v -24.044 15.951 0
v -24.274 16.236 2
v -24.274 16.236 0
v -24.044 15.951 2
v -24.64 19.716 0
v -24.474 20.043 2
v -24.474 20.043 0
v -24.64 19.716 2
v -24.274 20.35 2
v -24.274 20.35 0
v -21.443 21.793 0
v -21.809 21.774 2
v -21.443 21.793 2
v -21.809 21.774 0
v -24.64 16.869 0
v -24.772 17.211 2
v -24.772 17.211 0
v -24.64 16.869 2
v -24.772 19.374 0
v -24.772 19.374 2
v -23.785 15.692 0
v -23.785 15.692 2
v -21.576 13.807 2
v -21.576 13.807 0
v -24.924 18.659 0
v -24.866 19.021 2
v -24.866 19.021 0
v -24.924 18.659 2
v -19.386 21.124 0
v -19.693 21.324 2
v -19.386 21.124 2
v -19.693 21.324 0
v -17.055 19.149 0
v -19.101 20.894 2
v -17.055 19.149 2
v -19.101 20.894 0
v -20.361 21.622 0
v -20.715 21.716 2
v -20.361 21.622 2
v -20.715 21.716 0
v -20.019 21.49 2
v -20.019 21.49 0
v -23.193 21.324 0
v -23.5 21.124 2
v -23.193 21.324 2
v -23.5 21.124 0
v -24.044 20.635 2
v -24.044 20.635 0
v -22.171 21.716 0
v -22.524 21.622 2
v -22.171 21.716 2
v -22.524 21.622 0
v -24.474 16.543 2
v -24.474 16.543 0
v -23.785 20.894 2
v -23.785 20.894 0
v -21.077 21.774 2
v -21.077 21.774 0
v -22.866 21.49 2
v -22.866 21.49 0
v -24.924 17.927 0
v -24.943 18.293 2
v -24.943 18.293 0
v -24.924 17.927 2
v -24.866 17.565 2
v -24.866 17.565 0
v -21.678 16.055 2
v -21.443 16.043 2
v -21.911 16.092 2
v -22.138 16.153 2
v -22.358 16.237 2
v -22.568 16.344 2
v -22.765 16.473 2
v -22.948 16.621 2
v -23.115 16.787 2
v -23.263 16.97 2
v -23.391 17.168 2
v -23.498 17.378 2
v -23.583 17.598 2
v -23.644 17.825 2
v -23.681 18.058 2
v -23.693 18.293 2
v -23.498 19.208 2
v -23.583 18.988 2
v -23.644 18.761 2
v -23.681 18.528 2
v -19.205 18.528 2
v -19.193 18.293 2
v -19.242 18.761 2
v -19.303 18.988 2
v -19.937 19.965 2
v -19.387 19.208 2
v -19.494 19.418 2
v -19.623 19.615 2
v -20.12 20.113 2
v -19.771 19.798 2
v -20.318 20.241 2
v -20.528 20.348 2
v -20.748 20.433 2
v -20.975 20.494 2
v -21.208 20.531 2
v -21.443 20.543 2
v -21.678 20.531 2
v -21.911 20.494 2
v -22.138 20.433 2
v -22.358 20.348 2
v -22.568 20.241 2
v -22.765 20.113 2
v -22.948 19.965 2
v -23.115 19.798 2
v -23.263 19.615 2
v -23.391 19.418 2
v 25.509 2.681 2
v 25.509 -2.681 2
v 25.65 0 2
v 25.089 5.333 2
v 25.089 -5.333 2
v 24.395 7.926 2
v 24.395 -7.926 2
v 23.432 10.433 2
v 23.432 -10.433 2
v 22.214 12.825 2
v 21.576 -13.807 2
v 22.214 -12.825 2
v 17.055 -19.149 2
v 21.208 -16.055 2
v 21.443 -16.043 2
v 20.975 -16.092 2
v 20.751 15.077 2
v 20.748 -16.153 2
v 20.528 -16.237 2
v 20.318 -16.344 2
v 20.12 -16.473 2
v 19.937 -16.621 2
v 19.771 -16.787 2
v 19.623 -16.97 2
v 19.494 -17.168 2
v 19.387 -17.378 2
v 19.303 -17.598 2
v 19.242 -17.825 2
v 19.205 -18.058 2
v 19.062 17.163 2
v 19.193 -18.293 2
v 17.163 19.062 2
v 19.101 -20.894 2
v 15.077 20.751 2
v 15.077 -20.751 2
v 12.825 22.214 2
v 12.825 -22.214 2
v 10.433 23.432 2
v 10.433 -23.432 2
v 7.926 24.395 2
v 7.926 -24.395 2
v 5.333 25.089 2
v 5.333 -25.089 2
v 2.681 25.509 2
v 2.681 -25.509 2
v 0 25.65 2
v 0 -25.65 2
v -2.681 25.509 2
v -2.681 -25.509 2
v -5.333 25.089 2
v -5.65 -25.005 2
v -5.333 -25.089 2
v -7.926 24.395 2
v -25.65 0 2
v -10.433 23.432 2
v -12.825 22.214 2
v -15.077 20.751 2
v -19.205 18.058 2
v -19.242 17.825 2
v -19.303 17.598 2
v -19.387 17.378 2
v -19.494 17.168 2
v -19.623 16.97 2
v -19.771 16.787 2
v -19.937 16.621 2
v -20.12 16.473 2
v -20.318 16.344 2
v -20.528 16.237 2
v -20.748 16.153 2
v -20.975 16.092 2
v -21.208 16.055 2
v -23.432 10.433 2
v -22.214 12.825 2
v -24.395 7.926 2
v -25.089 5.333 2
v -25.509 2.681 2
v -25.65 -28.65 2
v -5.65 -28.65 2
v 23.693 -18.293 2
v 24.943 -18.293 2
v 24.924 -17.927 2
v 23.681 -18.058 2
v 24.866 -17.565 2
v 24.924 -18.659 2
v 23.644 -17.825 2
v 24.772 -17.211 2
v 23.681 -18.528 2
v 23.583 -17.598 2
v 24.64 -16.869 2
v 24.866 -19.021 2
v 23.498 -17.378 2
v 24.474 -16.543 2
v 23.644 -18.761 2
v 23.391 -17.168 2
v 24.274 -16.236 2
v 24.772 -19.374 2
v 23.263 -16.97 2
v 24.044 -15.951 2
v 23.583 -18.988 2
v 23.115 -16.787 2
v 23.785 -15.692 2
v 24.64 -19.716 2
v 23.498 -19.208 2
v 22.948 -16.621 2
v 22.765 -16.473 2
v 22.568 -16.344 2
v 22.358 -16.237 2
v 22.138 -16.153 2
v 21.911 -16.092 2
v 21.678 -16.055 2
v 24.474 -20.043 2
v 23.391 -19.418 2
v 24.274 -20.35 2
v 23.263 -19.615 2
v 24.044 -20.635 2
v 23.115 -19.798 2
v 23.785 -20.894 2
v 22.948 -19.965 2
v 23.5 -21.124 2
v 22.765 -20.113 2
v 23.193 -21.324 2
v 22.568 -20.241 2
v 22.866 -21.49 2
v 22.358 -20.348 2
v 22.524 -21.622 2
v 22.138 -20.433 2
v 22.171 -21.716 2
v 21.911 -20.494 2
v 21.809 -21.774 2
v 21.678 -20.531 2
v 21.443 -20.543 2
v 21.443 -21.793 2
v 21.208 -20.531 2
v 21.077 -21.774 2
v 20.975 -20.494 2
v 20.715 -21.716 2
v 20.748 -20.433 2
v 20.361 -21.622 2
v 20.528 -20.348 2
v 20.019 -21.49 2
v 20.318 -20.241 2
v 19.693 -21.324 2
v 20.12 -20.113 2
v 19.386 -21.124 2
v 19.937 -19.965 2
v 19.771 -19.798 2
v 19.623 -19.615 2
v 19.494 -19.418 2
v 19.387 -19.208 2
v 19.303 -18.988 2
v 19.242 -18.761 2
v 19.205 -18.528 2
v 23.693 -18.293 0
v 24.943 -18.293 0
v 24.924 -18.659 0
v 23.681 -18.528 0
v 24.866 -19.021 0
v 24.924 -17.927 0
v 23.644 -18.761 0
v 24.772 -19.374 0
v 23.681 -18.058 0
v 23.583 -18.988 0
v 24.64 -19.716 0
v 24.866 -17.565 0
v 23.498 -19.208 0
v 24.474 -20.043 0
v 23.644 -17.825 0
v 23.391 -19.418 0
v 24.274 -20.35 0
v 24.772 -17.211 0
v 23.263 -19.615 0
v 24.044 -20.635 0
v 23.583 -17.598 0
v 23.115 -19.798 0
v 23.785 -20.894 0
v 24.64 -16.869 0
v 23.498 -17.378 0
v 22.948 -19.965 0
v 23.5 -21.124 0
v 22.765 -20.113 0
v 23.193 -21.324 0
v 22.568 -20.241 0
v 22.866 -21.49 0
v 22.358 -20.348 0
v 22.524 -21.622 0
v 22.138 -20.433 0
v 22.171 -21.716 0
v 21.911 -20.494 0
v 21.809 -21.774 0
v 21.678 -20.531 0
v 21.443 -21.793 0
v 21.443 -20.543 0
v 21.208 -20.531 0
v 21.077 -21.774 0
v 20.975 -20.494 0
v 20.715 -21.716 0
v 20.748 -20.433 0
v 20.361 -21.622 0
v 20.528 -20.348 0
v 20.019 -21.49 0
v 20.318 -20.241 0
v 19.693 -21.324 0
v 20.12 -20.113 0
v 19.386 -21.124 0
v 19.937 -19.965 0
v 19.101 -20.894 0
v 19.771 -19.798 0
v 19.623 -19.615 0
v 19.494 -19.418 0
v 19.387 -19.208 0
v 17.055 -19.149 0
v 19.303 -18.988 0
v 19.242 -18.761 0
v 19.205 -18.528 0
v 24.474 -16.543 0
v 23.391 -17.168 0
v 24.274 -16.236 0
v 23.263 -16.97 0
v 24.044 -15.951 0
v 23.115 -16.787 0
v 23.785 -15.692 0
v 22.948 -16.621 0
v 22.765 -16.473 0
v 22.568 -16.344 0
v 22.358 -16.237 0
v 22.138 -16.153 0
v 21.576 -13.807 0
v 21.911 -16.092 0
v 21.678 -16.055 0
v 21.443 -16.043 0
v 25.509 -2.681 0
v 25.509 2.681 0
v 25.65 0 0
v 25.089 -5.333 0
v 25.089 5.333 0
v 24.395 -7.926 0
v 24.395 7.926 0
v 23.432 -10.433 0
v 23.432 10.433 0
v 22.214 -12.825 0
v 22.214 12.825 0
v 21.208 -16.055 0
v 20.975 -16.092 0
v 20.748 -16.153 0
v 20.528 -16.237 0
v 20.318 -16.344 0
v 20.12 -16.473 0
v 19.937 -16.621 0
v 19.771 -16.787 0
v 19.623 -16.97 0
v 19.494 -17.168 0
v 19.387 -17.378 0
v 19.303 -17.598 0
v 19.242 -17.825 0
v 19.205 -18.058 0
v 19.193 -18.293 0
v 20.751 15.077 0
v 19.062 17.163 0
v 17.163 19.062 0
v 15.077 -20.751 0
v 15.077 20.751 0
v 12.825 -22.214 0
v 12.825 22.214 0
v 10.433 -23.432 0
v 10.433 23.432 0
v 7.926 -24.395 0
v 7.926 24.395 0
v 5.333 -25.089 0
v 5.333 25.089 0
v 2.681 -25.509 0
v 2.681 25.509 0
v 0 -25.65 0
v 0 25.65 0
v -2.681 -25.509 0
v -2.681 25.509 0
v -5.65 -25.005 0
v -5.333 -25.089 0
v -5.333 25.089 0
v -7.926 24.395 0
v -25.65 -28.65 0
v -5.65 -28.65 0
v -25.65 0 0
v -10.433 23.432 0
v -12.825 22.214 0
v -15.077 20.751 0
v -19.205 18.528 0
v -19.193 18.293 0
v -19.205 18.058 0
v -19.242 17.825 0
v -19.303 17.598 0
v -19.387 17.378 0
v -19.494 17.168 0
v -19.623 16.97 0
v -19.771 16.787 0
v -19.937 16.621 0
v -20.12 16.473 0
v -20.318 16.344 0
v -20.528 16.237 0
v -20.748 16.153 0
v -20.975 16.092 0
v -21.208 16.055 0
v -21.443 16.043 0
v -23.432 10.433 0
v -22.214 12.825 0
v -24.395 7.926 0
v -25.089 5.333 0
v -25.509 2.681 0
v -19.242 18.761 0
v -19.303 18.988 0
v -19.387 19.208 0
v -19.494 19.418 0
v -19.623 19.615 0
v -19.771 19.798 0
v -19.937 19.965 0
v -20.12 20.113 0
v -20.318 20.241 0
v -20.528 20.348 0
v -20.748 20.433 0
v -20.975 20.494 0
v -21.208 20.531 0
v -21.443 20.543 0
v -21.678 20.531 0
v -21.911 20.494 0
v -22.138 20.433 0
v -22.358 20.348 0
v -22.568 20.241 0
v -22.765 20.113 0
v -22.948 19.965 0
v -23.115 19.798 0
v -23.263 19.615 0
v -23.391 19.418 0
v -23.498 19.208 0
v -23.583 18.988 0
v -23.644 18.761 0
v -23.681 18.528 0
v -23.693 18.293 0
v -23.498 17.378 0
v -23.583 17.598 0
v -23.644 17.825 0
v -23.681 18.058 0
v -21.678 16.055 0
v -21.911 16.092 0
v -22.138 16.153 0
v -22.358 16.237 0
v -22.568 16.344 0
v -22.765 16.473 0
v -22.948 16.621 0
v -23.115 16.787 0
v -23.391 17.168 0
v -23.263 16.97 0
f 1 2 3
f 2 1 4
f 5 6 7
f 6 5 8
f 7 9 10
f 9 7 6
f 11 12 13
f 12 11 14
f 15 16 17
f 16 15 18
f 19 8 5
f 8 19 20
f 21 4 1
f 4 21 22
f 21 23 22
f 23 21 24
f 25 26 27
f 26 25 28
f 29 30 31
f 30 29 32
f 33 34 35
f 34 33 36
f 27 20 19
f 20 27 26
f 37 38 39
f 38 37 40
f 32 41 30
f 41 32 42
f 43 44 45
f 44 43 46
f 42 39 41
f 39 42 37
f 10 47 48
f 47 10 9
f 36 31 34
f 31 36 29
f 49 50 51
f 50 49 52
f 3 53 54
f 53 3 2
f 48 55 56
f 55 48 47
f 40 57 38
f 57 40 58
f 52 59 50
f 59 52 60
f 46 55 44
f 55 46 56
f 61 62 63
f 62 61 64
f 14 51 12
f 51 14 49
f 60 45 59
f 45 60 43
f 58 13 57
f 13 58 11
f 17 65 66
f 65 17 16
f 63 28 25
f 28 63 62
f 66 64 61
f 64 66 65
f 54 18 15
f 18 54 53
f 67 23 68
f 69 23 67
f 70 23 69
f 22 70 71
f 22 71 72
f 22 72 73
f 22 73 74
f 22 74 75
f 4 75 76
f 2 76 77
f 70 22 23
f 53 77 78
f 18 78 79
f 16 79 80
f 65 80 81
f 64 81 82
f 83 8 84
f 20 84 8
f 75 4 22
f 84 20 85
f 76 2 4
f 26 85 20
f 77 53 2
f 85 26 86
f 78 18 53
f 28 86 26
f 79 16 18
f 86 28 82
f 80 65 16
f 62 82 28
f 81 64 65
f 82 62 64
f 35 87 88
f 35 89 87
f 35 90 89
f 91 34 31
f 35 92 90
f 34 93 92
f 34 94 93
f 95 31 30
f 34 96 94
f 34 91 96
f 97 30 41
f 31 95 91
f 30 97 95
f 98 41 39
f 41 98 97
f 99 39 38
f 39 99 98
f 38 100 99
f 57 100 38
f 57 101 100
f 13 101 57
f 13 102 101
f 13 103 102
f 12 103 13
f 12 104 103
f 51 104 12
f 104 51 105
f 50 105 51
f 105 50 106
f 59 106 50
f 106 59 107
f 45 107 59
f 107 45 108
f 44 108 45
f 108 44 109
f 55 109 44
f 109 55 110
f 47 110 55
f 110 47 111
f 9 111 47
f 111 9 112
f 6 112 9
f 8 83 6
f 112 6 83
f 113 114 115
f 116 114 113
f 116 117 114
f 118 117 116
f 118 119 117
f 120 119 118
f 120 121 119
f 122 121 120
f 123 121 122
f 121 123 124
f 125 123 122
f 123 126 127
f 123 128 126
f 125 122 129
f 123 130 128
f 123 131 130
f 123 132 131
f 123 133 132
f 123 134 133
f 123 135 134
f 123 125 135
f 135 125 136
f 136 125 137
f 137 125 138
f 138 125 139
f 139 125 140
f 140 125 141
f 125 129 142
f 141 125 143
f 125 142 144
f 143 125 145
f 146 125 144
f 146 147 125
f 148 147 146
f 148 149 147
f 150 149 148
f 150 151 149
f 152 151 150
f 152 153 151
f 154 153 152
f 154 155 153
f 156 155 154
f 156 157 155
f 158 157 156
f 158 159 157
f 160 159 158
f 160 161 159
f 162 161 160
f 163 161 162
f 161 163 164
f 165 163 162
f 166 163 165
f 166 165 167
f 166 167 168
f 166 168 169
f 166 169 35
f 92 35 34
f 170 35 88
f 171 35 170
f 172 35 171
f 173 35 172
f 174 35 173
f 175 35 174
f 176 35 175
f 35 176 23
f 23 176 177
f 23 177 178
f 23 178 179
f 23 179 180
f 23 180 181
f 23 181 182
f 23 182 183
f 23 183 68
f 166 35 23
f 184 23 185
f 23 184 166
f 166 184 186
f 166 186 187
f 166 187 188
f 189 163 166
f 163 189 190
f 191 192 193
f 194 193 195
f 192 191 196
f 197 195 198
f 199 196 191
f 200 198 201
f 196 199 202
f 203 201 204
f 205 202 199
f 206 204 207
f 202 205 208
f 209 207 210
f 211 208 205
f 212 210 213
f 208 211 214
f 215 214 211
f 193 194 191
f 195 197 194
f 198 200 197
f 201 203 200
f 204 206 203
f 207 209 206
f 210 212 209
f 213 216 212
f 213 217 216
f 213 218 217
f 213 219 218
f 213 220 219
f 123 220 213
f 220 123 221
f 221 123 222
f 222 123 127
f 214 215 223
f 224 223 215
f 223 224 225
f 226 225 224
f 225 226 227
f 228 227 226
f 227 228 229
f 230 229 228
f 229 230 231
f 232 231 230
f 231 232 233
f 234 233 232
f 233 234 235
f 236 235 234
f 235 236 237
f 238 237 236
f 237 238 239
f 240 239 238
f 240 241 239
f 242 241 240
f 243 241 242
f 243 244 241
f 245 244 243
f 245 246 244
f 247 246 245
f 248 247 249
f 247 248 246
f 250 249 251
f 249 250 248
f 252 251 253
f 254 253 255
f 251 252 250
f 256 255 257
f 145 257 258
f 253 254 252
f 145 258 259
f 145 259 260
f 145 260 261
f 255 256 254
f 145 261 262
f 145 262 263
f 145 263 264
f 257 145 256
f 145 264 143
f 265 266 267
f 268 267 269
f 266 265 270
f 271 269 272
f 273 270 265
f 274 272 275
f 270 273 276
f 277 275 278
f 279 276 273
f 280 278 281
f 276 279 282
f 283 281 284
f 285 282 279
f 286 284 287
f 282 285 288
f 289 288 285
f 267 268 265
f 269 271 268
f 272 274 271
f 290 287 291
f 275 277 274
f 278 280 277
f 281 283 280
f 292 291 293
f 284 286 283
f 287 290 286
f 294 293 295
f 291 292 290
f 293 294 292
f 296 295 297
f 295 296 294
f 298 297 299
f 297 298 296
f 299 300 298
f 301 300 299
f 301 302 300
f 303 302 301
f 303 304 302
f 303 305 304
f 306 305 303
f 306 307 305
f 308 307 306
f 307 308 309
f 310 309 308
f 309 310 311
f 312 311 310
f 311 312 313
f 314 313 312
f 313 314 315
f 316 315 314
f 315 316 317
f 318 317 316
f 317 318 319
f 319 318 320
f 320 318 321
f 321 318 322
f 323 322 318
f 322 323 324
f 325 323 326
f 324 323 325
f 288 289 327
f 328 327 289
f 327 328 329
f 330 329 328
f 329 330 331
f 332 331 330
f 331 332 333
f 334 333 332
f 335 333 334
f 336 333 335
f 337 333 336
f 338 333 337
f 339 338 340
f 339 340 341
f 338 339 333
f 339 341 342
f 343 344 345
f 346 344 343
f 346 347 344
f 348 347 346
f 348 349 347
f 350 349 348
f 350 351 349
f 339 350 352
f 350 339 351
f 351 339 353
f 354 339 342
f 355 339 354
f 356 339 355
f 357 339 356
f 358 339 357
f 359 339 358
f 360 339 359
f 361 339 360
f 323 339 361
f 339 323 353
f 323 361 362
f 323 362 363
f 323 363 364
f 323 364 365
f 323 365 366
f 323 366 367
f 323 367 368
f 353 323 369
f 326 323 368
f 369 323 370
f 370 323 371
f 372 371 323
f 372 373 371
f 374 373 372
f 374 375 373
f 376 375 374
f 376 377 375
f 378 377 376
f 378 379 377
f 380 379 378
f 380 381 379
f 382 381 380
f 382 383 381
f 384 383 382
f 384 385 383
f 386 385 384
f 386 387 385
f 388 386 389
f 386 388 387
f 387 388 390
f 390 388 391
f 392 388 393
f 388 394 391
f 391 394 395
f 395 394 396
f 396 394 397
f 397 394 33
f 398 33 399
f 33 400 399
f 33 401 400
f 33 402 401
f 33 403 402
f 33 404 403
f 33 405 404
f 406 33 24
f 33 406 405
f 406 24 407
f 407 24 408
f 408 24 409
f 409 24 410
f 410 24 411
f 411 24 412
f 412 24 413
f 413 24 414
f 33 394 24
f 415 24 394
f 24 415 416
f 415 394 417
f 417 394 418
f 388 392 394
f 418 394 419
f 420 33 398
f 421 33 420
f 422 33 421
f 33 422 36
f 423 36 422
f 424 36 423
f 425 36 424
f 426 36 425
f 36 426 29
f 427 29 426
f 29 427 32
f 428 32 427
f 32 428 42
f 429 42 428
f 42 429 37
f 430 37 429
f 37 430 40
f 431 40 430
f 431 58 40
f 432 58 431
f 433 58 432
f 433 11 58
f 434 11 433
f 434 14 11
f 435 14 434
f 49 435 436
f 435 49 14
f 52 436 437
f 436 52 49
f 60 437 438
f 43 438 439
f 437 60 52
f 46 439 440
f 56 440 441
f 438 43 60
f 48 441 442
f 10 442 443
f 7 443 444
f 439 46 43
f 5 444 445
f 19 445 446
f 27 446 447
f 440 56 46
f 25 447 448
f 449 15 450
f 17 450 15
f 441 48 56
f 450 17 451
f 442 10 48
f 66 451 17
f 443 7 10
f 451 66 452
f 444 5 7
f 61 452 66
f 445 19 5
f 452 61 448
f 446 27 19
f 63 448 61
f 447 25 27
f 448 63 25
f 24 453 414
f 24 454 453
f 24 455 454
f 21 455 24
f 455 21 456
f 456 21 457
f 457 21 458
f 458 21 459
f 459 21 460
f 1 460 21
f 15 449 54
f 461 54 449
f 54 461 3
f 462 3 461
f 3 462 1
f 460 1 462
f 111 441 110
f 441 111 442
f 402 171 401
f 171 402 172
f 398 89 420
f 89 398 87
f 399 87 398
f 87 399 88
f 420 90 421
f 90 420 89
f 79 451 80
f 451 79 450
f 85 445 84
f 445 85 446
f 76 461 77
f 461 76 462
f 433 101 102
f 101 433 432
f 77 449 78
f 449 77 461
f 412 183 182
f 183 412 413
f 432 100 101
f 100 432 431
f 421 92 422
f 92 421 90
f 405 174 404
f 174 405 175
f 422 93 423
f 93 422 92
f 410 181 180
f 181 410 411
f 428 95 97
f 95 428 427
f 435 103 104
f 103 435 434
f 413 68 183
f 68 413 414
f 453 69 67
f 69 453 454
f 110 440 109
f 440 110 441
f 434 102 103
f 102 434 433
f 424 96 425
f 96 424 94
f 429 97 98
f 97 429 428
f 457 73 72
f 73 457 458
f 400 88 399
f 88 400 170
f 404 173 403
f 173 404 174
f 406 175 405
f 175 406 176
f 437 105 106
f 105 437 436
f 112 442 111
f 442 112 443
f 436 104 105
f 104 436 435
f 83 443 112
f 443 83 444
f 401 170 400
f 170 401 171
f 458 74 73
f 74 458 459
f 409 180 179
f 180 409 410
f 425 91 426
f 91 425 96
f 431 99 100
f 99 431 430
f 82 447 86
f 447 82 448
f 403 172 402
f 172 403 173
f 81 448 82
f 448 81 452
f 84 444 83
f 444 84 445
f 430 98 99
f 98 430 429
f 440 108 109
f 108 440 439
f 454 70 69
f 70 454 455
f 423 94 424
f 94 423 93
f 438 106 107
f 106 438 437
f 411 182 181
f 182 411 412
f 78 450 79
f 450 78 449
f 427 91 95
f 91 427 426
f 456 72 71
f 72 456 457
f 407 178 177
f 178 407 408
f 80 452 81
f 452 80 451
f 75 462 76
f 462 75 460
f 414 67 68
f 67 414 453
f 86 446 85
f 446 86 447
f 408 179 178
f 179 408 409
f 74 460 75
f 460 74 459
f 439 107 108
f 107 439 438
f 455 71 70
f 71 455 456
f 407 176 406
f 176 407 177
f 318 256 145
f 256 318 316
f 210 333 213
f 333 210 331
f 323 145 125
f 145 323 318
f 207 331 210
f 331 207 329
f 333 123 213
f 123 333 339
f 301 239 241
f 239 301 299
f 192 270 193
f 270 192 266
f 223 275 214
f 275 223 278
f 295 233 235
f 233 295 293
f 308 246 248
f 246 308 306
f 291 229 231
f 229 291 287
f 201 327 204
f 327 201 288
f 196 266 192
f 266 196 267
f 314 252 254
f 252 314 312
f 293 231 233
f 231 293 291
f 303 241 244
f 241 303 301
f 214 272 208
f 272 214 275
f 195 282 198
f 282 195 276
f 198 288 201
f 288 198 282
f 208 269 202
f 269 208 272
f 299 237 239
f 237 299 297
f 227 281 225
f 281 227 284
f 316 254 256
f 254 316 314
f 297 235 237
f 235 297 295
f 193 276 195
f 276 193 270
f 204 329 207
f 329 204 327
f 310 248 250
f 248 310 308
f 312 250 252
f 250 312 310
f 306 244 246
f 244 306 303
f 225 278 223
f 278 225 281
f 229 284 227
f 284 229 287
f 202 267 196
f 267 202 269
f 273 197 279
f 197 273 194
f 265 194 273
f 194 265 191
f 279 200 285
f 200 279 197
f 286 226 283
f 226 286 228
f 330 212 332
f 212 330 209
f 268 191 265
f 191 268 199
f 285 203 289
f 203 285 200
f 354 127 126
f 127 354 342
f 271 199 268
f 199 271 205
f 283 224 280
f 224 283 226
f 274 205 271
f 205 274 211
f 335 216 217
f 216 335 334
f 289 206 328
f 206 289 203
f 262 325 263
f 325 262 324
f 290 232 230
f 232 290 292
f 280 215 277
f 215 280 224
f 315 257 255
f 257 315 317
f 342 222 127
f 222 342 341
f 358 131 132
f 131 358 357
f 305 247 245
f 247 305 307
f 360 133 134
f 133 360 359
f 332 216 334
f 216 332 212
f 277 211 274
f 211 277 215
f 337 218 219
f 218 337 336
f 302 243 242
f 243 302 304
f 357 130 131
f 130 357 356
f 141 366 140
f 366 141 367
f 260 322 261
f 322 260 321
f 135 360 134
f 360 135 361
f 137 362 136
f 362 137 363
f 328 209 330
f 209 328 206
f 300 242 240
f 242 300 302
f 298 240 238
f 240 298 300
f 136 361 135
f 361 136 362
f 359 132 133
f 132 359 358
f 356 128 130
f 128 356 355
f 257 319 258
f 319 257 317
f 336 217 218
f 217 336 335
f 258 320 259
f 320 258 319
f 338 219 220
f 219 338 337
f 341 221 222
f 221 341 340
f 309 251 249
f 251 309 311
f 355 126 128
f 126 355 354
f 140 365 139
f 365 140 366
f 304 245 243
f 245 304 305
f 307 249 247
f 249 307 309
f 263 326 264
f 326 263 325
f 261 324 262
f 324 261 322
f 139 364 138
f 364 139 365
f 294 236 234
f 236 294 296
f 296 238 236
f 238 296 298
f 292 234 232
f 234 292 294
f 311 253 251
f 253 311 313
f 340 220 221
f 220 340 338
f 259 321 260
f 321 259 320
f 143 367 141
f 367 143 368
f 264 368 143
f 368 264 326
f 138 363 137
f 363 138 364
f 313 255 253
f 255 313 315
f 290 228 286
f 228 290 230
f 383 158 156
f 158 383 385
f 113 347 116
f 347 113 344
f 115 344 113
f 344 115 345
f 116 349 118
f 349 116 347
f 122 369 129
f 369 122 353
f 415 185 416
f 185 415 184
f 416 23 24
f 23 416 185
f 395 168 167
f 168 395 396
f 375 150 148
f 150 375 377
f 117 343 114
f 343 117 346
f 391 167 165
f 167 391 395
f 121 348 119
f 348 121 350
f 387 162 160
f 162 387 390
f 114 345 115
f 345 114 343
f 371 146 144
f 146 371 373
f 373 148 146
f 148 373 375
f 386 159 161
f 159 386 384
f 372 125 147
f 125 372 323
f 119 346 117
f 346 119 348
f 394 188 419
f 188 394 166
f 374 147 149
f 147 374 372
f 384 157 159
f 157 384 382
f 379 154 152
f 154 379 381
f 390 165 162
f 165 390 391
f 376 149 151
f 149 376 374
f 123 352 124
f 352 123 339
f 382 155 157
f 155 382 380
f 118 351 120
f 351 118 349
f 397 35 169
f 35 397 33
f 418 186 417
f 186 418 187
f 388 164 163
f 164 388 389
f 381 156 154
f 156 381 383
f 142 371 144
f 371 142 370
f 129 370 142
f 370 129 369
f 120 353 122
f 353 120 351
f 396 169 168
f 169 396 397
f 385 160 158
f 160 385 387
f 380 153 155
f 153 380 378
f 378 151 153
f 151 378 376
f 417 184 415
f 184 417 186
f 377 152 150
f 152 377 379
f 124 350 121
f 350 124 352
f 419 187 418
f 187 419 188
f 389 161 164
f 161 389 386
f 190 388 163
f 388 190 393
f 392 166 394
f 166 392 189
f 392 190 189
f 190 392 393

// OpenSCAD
$fn=60;

upper=[24,20,50];
insert=13.6+1.4; dx=5;

lower=[41.5,20+insert,47];
screws=[5,5,3];
diam=51.3; diams2=[4.5,7];
export=3;


%eaxis();
//fanmount();

radialfan(2);


module eaxis()
{
	cube(upper);
	translate([-dx,-insert,-lower[2]])
		cube(lower);
}
module fanmount()
{
	d=2;
	
	difference()
	{
		translate([0,-d,0])
			cube([upper[0],d,10]);
		for (i=[-1:2:1])
			translate([upper[0]/2+i*(upper[0]/2-screws[0]),-d,screws[1]])
				rotate(-90,[1,0,0])
					cylinder(h=d,d=screws[2]);
	}
	translate([0,-d-insert,-d])
		cube([upper[0],d+insert,d]);
	/*translate([-dx,-d-insert,-lower[2]])
		cube([lower[0],d,lower[2]]);*/

	translate([diam/2-dx,-insert,-diam/2+10])
		rotate(90,[1,0,0])
			difference()
			{
				xy=[-8.2,28.1];
				radialfan(d);
				translate([xy[0],xy[1],0])
					hull()
					{
						cylinder(h=d,d=25);
						translate([100,0,0])
							cylinder(h=d,d=25);
					}
			}
}

module radialfan(height=15)
{
	exhauser=[20,diam/2+3,height];
	cylinder(d=diam,h=height);
	translate([-diam/2,-exhauser[1],0])
		cube(exhauser);
	dh=sqrt(0.5);

	difference()
	{
		hull()
		{
			translate([-diam/2+diams2[1]/2+dh,19-dh,0])
				cylinder(h=height,d=diams2[1]);
			cylinder(h=height,d=diams2[1]);
		}
		translate([-diam/2+diams2[1]/2+dh,19-dh,0])
			cylinder(h=height,d=diams2[0]);
	}
	difference()
	{
		hull()
		{
			translate([diam/2-diams2[1]/2-dh,-19+dh,0])
				cylinder(h=height,d=diams2[1]);
			cylinder(h=height,d=diams2[1]);
		}
		translate([diam/2-diams2[1]/2-dh,-19+dh,0])
			cylinder(h=height,d=diams2[0]);
	}
}
